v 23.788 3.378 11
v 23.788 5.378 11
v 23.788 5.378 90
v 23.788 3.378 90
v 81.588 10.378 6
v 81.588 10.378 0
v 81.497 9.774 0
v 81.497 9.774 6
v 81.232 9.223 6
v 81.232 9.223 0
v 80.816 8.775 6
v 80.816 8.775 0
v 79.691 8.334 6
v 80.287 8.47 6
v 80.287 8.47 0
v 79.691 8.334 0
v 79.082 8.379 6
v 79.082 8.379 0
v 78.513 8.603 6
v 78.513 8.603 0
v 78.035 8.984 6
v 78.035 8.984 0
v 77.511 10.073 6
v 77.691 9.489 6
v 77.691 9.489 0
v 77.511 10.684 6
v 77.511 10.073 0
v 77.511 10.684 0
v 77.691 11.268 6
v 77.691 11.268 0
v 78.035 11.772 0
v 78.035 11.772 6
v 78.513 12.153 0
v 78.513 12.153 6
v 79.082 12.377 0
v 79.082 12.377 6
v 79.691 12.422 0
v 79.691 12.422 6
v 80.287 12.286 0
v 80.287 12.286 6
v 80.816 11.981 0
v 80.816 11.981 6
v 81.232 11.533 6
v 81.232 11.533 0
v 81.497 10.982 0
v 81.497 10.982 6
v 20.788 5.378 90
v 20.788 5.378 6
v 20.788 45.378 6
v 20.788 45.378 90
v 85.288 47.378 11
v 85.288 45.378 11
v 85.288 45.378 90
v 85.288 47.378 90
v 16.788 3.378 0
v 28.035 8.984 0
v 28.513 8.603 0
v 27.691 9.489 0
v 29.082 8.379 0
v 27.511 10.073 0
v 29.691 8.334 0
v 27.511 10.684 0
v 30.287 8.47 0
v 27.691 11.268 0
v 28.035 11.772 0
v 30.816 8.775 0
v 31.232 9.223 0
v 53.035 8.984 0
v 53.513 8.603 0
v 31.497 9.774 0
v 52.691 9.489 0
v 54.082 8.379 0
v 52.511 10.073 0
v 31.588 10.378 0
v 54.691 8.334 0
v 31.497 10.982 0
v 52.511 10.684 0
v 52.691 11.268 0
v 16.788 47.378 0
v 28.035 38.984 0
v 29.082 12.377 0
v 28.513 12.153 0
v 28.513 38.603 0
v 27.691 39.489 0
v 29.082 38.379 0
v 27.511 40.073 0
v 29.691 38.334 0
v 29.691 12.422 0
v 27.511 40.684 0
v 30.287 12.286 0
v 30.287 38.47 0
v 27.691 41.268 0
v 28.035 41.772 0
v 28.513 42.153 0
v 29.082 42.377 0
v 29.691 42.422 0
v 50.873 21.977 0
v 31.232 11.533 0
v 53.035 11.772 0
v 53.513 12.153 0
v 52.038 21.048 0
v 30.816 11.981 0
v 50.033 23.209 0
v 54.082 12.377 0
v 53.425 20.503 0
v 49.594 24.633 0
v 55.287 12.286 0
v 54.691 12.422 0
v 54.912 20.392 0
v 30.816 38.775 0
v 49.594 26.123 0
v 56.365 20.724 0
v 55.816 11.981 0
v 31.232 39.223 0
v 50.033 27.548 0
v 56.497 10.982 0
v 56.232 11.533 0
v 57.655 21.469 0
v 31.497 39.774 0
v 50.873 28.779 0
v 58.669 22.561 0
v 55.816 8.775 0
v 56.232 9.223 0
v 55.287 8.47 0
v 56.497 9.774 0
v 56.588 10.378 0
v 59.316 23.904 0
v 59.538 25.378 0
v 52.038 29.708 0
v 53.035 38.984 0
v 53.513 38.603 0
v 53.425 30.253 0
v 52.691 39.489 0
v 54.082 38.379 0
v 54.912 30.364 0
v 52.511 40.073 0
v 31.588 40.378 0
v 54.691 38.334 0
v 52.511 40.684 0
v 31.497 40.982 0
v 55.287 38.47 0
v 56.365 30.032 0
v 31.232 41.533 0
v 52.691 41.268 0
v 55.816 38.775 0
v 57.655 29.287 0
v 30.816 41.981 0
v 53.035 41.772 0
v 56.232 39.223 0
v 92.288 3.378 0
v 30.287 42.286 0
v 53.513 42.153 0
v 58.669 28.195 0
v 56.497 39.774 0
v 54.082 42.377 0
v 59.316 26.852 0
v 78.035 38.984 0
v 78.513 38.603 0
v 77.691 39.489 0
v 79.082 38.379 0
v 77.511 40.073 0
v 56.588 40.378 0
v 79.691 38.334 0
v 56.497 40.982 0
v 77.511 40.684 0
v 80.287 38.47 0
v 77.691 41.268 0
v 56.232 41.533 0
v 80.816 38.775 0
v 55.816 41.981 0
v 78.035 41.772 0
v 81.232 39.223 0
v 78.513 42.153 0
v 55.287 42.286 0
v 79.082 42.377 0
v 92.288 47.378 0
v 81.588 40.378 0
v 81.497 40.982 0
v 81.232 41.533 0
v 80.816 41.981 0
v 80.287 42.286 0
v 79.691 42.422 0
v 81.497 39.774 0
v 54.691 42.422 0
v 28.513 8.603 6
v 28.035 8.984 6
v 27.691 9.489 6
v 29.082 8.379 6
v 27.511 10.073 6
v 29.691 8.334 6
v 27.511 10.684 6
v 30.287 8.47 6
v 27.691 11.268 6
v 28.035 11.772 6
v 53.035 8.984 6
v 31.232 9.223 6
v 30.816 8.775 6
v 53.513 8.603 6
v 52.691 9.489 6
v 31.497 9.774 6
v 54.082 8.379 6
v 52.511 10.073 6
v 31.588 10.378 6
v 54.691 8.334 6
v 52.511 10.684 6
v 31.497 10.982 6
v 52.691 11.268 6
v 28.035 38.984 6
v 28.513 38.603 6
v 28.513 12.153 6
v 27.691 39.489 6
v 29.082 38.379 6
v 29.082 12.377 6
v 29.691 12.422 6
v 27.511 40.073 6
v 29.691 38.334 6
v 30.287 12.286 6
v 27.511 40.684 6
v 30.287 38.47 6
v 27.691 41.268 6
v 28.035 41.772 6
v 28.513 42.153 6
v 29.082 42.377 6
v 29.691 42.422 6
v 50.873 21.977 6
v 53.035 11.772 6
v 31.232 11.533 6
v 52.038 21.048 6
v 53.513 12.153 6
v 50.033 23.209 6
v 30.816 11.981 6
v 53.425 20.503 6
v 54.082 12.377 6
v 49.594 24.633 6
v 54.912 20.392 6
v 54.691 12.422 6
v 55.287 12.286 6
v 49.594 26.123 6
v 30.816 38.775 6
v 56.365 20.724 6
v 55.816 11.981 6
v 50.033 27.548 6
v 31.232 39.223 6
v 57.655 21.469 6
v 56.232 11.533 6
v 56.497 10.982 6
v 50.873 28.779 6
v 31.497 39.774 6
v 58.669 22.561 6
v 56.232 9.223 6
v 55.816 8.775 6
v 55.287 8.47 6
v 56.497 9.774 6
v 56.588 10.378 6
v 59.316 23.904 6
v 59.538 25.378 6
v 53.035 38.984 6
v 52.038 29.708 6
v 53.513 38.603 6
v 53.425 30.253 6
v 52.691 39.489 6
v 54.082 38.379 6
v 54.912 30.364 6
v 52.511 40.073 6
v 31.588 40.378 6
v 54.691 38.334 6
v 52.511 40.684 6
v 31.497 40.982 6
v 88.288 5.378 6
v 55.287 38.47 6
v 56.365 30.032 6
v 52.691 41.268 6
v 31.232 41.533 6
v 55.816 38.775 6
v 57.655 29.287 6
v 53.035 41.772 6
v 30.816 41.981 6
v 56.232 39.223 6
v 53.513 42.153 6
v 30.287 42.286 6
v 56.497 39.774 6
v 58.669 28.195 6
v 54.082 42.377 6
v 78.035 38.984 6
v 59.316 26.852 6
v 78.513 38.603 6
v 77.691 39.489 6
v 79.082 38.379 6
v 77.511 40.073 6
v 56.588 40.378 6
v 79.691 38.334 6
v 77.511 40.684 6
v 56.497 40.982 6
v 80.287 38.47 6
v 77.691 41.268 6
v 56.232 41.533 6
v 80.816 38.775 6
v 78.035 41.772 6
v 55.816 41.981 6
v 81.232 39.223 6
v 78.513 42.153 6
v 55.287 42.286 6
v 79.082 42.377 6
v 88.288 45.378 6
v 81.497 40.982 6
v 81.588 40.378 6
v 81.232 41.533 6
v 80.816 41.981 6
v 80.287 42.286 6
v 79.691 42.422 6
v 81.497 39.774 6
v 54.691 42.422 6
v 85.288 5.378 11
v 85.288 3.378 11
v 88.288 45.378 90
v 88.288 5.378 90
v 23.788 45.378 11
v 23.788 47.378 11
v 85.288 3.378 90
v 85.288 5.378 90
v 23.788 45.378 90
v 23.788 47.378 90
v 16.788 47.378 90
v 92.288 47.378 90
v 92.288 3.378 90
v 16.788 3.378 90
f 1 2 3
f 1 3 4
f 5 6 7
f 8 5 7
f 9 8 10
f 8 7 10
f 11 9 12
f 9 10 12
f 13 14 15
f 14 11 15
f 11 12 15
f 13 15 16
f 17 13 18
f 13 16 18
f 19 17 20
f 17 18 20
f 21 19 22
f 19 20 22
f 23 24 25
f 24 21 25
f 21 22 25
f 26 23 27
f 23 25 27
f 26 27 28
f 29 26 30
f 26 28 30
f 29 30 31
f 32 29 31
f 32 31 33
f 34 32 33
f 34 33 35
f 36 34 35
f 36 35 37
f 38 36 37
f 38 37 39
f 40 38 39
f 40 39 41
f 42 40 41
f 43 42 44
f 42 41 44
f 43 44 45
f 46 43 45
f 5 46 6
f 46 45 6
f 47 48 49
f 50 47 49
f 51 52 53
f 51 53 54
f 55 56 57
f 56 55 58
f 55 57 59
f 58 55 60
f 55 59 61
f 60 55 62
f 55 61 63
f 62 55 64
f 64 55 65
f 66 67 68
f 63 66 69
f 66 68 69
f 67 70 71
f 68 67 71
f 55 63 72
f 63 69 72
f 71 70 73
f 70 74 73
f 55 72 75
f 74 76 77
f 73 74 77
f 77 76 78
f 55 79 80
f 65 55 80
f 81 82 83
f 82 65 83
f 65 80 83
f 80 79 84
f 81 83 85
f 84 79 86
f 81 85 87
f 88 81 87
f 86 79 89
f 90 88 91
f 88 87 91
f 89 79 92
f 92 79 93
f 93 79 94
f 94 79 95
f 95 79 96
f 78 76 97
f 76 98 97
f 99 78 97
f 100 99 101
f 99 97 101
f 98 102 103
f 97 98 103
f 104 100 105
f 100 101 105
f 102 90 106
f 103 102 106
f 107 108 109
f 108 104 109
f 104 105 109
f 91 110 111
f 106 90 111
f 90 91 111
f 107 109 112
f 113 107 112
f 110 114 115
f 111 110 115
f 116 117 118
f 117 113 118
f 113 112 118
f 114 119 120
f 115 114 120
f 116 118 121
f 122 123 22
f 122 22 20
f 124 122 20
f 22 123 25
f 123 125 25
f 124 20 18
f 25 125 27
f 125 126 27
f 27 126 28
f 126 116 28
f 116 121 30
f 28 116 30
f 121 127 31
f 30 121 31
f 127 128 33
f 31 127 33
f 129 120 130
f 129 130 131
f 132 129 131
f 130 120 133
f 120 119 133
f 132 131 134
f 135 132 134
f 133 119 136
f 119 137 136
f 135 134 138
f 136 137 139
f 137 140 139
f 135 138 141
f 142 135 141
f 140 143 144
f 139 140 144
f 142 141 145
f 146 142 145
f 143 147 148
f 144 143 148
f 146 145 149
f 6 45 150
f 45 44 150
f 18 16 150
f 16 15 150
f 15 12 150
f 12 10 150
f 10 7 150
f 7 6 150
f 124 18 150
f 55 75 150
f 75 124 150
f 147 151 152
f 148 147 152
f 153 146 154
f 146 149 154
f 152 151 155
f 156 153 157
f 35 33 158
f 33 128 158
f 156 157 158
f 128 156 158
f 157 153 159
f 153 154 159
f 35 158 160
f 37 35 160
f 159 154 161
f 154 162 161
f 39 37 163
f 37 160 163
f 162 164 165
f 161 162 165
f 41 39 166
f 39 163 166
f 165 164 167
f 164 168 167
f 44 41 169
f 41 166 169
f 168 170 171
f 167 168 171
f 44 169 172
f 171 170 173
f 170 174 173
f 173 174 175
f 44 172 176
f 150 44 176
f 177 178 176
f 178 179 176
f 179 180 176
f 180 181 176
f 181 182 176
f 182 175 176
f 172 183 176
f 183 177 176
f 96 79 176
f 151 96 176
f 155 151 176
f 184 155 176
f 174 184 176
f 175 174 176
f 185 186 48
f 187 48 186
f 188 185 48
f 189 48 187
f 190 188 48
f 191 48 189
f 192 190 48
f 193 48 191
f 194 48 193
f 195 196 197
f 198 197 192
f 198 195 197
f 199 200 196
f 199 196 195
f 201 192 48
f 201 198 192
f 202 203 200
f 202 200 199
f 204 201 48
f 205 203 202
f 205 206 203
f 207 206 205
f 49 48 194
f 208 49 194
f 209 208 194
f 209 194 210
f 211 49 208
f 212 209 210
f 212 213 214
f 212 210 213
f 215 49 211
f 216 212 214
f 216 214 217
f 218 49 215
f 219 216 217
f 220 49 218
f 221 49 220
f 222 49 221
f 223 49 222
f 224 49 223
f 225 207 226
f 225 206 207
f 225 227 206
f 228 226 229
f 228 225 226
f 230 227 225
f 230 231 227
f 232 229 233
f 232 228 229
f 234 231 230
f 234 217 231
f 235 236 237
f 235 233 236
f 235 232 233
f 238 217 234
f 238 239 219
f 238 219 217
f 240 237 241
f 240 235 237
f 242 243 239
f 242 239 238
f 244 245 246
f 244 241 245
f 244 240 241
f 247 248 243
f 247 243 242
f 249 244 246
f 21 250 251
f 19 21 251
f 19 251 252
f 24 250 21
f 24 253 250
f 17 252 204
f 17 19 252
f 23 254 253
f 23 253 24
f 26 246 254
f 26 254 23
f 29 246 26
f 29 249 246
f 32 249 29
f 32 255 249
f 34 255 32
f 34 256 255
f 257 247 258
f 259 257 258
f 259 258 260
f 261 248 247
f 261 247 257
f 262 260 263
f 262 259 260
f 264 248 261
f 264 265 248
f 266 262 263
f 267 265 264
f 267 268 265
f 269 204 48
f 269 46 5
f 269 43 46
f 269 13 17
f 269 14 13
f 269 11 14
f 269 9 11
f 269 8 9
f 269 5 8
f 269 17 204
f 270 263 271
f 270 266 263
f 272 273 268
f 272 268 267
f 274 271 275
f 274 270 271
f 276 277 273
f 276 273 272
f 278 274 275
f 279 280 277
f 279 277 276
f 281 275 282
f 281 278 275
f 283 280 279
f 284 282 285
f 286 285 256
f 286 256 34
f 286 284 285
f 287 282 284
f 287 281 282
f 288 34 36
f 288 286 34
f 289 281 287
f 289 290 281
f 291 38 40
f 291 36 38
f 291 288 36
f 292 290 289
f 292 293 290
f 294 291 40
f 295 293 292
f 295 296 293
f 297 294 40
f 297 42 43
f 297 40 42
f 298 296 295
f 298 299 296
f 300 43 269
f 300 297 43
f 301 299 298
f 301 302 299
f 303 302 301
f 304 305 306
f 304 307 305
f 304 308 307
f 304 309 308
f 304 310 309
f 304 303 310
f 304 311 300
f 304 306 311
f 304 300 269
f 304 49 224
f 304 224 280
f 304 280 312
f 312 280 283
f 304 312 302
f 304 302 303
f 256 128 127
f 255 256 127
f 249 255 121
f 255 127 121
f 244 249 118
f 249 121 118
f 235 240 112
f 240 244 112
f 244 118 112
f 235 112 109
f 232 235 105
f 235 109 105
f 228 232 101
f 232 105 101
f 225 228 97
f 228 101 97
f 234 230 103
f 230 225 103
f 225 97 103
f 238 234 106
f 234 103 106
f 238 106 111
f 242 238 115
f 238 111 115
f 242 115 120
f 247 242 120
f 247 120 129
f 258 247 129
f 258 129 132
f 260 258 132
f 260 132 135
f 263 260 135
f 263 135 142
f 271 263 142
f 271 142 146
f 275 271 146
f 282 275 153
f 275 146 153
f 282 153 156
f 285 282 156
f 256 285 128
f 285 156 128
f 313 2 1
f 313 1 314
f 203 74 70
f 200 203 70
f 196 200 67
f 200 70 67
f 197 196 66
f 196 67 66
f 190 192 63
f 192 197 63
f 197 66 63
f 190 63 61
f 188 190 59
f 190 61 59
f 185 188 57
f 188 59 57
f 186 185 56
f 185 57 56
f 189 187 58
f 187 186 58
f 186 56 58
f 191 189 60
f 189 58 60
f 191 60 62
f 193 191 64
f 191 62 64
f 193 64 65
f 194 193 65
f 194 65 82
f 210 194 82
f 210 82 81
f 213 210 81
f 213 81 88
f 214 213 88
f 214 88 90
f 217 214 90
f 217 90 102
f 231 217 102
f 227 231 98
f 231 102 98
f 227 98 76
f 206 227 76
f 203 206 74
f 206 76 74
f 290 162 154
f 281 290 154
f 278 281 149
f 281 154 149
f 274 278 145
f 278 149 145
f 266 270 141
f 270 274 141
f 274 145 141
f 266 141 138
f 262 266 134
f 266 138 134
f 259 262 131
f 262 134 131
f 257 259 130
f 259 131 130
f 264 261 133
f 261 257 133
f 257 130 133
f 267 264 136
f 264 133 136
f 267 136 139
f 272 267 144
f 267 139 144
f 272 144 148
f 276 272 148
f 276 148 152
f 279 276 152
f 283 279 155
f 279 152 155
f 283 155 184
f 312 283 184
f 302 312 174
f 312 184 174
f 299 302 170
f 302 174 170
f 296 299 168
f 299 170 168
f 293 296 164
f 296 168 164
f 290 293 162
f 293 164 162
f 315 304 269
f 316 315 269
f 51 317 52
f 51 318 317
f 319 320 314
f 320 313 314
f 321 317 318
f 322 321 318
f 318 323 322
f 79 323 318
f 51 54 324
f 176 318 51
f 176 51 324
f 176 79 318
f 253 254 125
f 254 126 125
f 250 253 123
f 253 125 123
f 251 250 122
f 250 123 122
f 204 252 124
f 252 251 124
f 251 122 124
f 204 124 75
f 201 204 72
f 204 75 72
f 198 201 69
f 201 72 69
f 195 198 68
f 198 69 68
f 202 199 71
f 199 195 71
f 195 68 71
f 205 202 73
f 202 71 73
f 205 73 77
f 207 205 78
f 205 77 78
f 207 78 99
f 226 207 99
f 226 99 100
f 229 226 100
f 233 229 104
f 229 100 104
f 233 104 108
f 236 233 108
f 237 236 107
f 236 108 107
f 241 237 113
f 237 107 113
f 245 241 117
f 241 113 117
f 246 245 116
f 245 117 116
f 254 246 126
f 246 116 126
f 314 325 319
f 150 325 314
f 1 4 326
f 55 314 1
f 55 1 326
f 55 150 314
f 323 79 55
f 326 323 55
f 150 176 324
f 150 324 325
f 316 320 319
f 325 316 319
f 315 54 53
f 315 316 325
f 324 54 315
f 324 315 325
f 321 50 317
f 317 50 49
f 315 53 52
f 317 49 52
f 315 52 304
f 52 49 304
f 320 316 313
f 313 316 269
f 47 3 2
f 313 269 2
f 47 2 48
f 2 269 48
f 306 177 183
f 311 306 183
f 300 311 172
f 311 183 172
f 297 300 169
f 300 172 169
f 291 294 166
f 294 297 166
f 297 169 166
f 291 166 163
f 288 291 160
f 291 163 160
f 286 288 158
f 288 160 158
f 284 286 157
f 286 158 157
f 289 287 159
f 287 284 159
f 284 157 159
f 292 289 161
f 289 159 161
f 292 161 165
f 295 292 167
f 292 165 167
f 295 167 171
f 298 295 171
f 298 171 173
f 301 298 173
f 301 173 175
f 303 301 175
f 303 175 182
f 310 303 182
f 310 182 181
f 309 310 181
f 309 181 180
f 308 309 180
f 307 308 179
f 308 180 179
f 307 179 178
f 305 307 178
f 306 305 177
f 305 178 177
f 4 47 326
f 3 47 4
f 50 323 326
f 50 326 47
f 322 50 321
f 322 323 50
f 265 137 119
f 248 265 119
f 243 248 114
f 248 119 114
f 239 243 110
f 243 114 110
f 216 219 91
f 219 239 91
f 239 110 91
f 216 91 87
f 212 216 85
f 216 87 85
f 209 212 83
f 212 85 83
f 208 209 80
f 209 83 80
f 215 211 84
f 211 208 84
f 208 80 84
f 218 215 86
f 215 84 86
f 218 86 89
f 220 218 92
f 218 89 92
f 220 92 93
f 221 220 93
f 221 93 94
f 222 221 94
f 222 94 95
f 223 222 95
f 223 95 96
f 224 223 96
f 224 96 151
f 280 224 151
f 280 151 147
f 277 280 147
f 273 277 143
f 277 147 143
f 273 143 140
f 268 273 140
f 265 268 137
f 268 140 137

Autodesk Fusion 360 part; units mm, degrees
sketch "Schizzo1" plane through (0, 0, 0) normal (0, 0, 1) x (1, 0, 0)
  line L0 (20.7879, 45.3781) -> (88.2879, 45.3781)
  line L1 (88.2879, 45.3781) -> (88.2879, 5.3781)
  line L2 (88.2879, 5.3781) -> (20.7879, 5.3781)
  line L3 (20.7879, 5.3781) -> (20.7879, 45.3781)
  line L4 (20.7879, 45.3781) -> (16.7879, 45.3781)
  line L5 (16.7879, 45.3781) -> (16.7879, 5.3781)
  line L6 (16.7879, 5.3781) -> (20.7879, 5.3781)
  line L7 (20.7879, 5.3781) -> (20.7879, 45.3781)
  line L8 (54.5379, 45.3781) -> (54.5379, 5.3781) construction
  line L9 (88.2879, 25.3781) -> (20.7879, 25.3781) construction
  line L10 (92.2879, 45.3781) -> (92.2879, 5.3781)
  line L11 (88.2879, 5.3781) -> (88.2879, 45.3781)
  line L12 (92.2879, 5.3781) -> (88.2879, 5.3781)
  line L13 (88.2879, 45.3781) -> (92.2879, 45.3781)
  line L14 (79.5379, 10.3781) -> (29.5379, 10.3781) construction
  line L15 (29.5379, 10.3781) -> (29.5379, 40.3781) construction
  line L16 (29.5379, 40.3781) -> (79.5379, 40.3781) construction
  line L17 (79.5379, 40.3781) -> (79.5379, 10.3781) construction
  line L18 (79.5379, 10.3781) -> (29.5379, 40.3781) construction
  line L19 (29.5379, 10.3781) -> (79.5379, 40.3781) construction
  circle A0 centre (29.5379, 40.3781) radius 2.05
  circle A1 centre (79.5379, 40.3781) radius 2.05
  circle A2 centre (29.5379, 10.3781) radius 2.05
  circle A3 centre (79.5379, 10.3781) radius 2.05
  circle A4 centre (54.5379, 40.3781) radius 2.05
  circle A5 centre (54.5379, 10.3781) radius 2.05
  line L20 (16.7879, 5.3781) -> (23.7879, 5.3781)
  line L21 (23.7879, 5.3781) -> (23.7879, 3.3781)
  line L22 (23.7879, 3.3781) -> (16.7879, 3.3781)
  line L23 (16.7879, 3.3781) -> (16.7879, 5.3781)
  line L24 (16.7879, 45.3781) -> (23.7879, 45.3781)
  line L25 (23.7879, 47.3781) -> (16.7879, 47.3781)
  line L26 (23.7879, 45.3781) -> (23.7879, 47.3781)
  line L27 (16.7879, 47.3781) -> (16.7879, 45.3781)
  line L28 (92.2879, 45.3781) -> (85.2879, 45.3781)
  line L29 (92.2879, 5.3781) -> (85.2879, 5.3781)
  line L30 (85.2879, 3.3781) -> (92.2879, 3.3781)
  line L31 (85.2879, 5.3781) -> (85.2879, 3.3781)
  line L32 (92.2879, 3.3781) -> (92.2879, 5.3781)
  line L33 (85.2879, 47.3781) -> (92.2879, 47.3781)
  line L34 (85.2879, 45.3781) -> (85.2879, 47.3781)
  line L35 (92.2879, 47.3781) -> (92.2879, 45.3781)
  circle A6 centre (54.5379, 25.3781) radius 5
  line L36 (23.7879, 5.3781) -> (85.2879, 5.3781)
  line L37 (85.2879, 5.3781) -> (85.2879, 3.3781)
  line L38 (85.2879, 3.3781) -> (23.7879, 3.3781)
  line L39 (23.7879, 3.3781) -> (23.7879, 5.3781)
  line L40 (23.7879, 47.3781) -> (85.2879, 47.3781)
  line L41 (85.2879, 47.3781) -> (85.2879, 45.3781)
  line L42 (85.2879, 45.3781) -> (23.7879, 45.3781)
  line L43 (23.7879, 45.3781) -> (23.7879, 47.3781)
  point P0 (54.5379, 25.3781)
  dimension "d1" = 67.5
  dimension "d2" = 40
  dimension "d3" = 4
  dimension "d4" = 50
  dimension "d5" = 30
  dimension "d6" = 4.1
  dimension "d8" = 4.1
  dimension "d13" = 7
  dimension "d14" = 2
  dimension "d15" = 10
  dimension "d19" = 7
  dimension "d20" = 75.5
extrude "Estrusione1" add sketch "Schizzo1" along normal blind 6 contours L0 L1 L2 L3 L7 L11 L20 L24 L28 L29 L36 L42 | L0 L26 L34 L40 L41 L42 L43 | L2 L21 L31 L36 L37 L38 L39
extrude "Estrusione2" add sketch "Schizzo1" along normal blind 90 contours L0 L4 L24 L25 L26 L27 L43 | L3 L4 L5 L6 L7 L20 L24 | L2 L6 L20 L21 L22 L23 L39 | L0 L13 L28 L33 L34 L35 L41 | L1 L10 L11 L12 L13 L28 L29 | L2 L12 L29 L30 L31 L32 L37
extrude "Estrusione3" add sketch "Schizzo1" along normal blind 5 from surface at 6 contours L0 L26 L34 L40 L41 L42 L43 | L2 L21 L31 L36 L37 L38 L39
equation "d8 = d6"
